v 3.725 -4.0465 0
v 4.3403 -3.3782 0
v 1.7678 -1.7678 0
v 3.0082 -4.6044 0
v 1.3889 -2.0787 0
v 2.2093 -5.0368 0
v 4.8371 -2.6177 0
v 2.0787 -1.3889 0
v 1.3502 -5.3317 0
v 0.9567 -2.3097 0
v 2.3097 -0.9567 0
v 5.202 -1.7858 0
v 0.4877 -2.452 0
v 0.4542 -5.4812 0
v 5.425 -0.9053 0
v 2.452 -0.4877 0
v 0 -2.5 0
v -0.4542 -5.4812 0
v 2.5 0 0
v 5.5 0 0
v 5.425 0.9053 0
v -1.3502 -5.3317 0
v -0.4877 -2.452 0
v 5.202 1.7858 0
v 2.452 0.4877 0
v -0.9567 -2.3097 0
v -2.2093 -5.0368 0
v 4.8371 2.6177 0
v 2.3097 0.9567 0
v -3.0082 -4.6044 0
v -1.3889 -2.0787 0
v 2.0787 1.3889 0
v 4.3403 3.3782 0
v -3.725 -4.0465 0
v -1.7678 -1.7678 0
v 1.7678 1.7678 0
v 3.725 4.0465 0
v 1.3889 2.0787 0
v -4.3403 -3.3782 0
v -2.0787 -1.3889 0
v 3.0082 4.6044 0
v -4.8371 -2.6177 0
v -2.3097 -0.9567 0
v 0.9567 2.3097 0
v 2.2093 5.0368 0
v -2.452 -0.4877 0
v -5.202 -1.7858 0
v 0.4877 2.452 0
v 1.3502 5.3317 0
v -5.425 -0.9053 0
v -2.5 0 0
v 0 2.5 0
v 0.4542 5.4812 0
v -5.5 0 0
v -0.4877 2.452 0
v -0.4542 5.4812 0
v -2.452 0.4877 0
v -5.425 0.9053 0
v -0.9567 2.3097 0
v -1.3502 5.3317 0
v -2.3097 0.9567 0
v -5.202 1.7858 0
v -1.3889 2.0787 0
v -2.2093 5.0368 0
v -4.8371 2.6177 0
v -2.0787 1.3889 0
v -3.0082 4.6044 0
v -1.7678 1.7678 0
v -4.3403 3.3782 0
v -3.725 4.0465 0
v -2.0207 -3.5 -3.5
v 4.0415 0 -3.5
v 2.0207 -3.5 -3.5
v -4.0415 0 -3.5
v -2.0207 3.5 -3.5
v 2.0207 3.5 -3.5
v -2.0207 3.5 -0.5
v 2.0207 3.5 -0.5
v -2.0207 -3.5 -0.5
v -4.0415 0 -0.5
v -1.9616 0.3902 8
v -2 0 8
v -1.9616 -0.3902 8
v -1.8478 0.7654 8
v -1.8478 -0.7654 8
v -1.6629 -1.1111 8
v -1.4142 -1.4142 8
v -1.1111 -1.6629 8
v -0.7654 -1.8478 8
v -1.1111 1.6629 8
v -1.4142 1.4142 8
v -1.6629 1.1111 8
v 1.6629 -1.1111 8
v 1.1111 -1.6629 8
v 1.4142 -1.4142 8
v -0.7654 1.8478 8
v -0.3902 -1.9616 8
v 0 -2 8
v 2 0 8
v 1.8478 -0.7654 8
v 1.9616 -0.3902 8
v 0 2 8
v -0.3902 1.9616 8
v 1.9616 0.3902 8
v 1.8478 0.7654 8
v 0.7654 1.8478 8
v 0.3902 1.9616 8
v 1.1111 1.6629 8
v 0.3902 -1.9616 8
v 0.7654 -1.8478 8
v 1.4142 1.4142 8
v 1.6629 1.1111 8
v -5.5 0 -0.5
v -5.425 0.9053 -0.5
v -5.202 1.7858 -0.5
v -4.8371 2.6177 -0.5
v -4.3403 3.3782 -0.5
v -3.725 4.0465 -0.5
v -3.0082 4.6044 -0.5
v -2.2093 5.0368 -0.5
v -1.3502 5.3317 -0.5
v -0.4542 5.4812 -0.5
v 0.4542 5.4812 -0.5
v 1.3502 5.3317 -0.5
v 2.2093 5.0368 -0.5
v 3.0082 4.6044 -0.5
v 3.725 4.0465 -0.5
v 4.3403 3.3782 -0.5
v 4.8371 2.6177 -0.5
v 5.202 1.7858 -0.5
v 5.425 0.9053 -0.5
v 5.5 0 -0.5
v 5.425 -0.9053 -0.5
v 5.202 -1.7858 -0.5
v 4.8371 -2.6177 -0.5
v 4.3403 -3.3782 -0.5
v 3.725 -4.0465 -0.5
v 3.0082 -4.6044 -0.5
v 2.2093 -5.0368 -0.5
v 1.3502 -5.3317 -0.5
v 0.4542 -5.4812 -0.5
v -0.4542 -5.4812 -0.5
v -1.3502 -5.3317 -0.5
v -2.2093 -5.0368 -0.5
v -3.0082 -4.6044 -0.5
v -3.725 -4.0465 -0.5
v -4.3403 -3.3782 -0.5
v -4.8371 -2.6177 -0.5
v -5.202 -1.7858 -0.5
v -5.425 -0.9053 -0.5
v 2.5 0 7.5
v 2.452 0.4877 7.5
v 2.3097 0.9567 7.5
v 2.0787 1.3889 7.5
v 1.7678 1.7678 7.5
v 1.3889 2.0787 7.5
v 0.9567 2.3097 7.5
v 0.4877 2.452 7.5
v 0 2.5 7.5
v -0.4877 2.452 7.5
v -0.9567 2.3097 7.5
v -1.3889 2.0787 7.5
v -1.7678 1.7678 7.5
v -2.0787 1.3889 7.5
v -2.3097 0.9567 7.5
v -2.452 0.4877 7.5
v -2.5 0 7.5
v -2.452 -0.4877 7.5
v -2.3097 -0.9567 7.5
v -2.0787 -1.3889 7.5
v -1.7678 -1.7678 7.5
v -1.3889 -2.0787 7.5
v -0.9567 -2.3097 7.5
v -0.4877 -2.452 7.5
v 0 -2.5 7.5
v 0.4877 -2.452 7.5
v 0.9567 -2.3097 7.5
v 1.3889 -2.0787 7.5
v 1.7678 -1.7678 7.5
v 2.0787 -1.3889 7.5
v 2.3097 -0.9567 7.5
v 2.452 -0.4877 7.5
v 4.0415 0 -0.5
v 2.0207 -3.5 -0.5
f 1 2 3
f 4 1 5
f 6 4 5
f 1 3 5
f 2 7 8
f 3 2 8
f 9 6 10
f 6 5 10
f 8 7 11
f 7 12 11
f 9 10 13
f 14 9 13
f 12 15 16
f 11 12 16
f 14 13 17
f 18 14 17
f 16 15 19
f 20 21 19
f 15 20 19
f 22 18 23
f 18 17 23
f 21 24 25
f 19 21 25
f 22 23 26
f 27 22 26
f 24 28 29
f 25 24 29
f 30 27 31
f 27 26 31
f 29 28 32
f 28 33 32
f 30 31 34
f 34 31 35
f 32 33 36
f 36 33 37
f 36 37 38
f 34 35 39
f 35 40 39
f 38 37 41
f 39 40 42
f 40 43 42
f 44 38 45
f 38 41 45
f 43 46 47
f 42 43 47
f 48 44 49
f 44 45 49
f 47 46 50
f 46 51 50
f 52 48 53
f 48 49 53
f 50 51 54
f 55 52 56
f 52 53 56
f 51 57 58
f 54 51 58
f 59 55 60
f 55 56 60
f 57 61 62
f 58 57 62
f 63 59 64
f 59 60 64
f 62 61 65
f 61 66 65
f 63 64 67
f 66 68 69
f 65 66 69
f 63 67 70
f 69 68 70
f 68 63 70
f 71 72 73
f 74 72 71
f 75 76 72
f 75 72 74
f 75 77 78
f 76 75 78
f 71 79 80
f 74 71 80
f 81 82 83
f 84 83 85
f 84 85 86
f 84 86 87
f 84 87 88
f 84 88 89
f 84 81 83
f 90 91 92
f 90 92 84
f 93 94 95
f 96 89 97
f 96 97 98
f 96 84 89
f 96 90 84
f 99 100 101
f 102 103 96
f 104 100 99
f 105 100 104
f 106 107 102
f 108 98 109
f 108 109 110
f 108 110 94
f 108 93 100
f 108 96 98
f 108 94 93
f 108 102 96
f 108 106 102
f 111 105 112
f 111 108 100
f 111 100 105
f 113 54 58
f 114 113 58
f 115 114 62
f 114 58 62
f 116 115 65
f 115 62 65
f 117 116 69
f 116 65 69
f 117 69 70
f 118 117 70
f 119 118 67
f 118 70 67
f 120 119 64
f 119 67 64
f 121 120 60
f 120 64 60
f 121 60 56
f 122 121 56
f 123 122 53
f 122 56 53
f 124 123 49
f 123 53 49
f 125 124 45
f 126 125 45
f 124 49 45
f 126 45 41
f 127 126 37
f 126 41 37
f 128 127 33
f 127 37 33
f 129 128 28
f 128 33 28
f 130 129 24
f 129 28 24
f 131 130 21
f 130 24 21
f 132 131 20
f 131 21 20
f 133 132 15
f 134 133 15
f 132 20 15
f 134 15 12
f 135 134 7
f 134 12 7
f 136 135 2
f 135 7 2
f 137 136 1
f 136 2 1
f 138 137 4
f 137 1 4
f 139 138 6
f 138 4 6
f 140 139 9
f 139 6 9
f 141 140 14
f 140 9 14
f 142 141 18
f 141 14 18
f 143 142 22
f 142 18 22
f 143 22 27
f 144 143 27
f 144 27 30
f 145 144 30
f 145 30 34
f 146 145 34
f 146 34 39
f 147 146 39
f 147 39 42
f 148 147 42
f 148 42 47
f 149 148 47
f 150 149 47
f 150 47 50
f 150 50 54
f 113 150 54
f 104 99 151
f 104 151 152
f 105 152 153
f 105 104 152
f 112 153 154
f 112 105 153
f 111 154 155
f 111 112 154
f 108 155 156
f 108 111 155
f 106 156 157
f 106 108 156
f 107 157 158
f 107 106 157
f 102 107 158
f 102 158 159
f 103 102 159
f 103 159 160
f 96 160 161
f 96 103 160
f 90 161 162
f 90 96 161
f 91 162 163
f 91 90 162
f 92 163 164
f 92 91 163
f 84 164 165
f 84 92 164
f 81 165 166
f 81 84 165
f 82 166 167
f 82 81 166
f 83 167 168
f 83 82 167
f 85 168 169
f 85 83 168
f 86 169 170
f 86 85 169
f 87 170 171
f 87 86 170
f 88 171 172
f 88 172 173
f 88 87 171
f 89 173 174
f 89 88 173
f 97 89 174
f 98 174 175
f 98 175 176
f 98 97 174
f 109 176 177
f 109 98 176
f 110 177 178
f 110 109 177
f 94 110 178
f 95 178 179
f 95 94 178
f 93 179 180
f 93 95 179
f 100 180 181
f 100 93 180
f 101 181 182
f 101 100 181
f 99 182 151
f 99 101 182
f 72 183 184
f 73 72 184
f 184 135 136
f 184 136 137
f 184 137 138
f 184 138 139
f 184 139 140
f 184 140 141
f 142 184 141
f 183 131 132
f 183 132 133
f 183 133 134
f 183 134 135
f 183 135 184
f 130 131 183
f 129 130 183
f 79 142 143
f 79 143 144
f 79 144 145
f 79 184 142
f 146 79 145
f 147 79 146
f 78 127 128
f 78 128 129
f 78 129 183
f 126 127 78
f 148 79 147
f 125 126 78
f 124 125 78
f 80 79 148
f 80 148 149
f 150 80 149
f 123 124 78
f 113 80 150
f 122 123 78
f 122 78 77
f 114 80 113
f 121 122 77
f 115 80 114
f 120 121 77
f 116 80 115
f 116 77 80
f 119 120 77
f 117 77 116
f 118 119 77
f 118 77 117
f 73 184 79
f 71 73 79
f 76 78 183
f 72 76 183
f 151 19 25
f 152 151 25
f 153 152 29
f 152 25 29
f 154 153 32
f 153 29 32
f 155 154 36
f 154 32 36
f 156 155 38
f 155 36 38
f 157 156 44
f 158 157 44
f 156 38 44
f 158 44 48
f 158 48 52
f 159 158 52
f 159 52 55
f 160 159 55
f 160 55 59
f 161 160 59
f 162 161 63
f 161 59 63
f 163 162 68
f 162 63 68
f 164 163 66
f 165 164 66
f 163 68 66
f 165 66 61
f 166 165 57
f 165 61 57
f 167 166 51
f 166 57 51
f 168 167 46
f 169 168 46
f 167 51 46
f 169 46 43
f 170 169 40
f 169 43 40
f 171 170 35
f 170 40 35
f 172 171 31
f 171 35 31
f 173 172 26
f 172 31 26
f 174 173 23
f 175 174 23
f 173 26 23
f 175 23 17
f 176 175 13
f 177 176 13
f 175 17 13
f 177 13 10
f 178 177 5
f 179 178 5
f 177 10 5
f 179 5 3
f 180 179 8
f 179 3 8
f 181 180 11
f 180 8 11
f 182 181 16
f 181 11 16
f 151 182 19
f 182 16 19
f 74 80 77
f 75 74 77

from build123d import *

# Parameters (mm, degrees)
SKETCH1_R           = 2.5
BOSS_EXTRUDE1_DEPTH = 8
SKETCH2_R           = 5.5
BOSS_EXTRUDE2_DEPTH = 0.5
BOSS_EXTRUDE3_DEPTH = 3
CHAMFER3_SIZE       = 0.5


with BuildPart() as part:
    # Sketch1 → Boss-Extrude1 (new body)
    with BuildSketch(Plane.XY):
        Circle(SKETCH1_R)
    extrude(amount=BOSS_EXTRUDE1_DEPTH)

    # Sketch2 → Boss-Extrude2 (add)
    with BuildSketch(Plane(origin=(0, 0, 0), x_dir=(-1, 0, 0), z_dir=(0, 0, -1))):
        Circle(SKETCH2_R)
    extrude(amount=BOSS_EXTRUDE2_DEPTH)

    # Sketch3 → Boss-Extrude3 (add)
    with BuildSketch(Plane(origin=(0, 0, -0.5), x_dir=(-1, 0, 0), z_dir=(0, 0, -1))):
        Polygon((4.041451884, 0), (2.020725942, 3.5), (-2.020725942, 3.5), (-4.041451884, 0), (-2.020725942, -3.5), (2.020725942, -3.5), align=None)
    extrude(amount=BOSS_EXTRUDE3_DEPTH)

    # Chamfer3
    chamfer3_edges = [part.edges().sort_by_distance(p)[0] for p in [
        (-2.5, 0, 8),
    ]]
    chamfer(chamfer3_edges, length=CHAMFER3_SIZE)


solid = part.part
